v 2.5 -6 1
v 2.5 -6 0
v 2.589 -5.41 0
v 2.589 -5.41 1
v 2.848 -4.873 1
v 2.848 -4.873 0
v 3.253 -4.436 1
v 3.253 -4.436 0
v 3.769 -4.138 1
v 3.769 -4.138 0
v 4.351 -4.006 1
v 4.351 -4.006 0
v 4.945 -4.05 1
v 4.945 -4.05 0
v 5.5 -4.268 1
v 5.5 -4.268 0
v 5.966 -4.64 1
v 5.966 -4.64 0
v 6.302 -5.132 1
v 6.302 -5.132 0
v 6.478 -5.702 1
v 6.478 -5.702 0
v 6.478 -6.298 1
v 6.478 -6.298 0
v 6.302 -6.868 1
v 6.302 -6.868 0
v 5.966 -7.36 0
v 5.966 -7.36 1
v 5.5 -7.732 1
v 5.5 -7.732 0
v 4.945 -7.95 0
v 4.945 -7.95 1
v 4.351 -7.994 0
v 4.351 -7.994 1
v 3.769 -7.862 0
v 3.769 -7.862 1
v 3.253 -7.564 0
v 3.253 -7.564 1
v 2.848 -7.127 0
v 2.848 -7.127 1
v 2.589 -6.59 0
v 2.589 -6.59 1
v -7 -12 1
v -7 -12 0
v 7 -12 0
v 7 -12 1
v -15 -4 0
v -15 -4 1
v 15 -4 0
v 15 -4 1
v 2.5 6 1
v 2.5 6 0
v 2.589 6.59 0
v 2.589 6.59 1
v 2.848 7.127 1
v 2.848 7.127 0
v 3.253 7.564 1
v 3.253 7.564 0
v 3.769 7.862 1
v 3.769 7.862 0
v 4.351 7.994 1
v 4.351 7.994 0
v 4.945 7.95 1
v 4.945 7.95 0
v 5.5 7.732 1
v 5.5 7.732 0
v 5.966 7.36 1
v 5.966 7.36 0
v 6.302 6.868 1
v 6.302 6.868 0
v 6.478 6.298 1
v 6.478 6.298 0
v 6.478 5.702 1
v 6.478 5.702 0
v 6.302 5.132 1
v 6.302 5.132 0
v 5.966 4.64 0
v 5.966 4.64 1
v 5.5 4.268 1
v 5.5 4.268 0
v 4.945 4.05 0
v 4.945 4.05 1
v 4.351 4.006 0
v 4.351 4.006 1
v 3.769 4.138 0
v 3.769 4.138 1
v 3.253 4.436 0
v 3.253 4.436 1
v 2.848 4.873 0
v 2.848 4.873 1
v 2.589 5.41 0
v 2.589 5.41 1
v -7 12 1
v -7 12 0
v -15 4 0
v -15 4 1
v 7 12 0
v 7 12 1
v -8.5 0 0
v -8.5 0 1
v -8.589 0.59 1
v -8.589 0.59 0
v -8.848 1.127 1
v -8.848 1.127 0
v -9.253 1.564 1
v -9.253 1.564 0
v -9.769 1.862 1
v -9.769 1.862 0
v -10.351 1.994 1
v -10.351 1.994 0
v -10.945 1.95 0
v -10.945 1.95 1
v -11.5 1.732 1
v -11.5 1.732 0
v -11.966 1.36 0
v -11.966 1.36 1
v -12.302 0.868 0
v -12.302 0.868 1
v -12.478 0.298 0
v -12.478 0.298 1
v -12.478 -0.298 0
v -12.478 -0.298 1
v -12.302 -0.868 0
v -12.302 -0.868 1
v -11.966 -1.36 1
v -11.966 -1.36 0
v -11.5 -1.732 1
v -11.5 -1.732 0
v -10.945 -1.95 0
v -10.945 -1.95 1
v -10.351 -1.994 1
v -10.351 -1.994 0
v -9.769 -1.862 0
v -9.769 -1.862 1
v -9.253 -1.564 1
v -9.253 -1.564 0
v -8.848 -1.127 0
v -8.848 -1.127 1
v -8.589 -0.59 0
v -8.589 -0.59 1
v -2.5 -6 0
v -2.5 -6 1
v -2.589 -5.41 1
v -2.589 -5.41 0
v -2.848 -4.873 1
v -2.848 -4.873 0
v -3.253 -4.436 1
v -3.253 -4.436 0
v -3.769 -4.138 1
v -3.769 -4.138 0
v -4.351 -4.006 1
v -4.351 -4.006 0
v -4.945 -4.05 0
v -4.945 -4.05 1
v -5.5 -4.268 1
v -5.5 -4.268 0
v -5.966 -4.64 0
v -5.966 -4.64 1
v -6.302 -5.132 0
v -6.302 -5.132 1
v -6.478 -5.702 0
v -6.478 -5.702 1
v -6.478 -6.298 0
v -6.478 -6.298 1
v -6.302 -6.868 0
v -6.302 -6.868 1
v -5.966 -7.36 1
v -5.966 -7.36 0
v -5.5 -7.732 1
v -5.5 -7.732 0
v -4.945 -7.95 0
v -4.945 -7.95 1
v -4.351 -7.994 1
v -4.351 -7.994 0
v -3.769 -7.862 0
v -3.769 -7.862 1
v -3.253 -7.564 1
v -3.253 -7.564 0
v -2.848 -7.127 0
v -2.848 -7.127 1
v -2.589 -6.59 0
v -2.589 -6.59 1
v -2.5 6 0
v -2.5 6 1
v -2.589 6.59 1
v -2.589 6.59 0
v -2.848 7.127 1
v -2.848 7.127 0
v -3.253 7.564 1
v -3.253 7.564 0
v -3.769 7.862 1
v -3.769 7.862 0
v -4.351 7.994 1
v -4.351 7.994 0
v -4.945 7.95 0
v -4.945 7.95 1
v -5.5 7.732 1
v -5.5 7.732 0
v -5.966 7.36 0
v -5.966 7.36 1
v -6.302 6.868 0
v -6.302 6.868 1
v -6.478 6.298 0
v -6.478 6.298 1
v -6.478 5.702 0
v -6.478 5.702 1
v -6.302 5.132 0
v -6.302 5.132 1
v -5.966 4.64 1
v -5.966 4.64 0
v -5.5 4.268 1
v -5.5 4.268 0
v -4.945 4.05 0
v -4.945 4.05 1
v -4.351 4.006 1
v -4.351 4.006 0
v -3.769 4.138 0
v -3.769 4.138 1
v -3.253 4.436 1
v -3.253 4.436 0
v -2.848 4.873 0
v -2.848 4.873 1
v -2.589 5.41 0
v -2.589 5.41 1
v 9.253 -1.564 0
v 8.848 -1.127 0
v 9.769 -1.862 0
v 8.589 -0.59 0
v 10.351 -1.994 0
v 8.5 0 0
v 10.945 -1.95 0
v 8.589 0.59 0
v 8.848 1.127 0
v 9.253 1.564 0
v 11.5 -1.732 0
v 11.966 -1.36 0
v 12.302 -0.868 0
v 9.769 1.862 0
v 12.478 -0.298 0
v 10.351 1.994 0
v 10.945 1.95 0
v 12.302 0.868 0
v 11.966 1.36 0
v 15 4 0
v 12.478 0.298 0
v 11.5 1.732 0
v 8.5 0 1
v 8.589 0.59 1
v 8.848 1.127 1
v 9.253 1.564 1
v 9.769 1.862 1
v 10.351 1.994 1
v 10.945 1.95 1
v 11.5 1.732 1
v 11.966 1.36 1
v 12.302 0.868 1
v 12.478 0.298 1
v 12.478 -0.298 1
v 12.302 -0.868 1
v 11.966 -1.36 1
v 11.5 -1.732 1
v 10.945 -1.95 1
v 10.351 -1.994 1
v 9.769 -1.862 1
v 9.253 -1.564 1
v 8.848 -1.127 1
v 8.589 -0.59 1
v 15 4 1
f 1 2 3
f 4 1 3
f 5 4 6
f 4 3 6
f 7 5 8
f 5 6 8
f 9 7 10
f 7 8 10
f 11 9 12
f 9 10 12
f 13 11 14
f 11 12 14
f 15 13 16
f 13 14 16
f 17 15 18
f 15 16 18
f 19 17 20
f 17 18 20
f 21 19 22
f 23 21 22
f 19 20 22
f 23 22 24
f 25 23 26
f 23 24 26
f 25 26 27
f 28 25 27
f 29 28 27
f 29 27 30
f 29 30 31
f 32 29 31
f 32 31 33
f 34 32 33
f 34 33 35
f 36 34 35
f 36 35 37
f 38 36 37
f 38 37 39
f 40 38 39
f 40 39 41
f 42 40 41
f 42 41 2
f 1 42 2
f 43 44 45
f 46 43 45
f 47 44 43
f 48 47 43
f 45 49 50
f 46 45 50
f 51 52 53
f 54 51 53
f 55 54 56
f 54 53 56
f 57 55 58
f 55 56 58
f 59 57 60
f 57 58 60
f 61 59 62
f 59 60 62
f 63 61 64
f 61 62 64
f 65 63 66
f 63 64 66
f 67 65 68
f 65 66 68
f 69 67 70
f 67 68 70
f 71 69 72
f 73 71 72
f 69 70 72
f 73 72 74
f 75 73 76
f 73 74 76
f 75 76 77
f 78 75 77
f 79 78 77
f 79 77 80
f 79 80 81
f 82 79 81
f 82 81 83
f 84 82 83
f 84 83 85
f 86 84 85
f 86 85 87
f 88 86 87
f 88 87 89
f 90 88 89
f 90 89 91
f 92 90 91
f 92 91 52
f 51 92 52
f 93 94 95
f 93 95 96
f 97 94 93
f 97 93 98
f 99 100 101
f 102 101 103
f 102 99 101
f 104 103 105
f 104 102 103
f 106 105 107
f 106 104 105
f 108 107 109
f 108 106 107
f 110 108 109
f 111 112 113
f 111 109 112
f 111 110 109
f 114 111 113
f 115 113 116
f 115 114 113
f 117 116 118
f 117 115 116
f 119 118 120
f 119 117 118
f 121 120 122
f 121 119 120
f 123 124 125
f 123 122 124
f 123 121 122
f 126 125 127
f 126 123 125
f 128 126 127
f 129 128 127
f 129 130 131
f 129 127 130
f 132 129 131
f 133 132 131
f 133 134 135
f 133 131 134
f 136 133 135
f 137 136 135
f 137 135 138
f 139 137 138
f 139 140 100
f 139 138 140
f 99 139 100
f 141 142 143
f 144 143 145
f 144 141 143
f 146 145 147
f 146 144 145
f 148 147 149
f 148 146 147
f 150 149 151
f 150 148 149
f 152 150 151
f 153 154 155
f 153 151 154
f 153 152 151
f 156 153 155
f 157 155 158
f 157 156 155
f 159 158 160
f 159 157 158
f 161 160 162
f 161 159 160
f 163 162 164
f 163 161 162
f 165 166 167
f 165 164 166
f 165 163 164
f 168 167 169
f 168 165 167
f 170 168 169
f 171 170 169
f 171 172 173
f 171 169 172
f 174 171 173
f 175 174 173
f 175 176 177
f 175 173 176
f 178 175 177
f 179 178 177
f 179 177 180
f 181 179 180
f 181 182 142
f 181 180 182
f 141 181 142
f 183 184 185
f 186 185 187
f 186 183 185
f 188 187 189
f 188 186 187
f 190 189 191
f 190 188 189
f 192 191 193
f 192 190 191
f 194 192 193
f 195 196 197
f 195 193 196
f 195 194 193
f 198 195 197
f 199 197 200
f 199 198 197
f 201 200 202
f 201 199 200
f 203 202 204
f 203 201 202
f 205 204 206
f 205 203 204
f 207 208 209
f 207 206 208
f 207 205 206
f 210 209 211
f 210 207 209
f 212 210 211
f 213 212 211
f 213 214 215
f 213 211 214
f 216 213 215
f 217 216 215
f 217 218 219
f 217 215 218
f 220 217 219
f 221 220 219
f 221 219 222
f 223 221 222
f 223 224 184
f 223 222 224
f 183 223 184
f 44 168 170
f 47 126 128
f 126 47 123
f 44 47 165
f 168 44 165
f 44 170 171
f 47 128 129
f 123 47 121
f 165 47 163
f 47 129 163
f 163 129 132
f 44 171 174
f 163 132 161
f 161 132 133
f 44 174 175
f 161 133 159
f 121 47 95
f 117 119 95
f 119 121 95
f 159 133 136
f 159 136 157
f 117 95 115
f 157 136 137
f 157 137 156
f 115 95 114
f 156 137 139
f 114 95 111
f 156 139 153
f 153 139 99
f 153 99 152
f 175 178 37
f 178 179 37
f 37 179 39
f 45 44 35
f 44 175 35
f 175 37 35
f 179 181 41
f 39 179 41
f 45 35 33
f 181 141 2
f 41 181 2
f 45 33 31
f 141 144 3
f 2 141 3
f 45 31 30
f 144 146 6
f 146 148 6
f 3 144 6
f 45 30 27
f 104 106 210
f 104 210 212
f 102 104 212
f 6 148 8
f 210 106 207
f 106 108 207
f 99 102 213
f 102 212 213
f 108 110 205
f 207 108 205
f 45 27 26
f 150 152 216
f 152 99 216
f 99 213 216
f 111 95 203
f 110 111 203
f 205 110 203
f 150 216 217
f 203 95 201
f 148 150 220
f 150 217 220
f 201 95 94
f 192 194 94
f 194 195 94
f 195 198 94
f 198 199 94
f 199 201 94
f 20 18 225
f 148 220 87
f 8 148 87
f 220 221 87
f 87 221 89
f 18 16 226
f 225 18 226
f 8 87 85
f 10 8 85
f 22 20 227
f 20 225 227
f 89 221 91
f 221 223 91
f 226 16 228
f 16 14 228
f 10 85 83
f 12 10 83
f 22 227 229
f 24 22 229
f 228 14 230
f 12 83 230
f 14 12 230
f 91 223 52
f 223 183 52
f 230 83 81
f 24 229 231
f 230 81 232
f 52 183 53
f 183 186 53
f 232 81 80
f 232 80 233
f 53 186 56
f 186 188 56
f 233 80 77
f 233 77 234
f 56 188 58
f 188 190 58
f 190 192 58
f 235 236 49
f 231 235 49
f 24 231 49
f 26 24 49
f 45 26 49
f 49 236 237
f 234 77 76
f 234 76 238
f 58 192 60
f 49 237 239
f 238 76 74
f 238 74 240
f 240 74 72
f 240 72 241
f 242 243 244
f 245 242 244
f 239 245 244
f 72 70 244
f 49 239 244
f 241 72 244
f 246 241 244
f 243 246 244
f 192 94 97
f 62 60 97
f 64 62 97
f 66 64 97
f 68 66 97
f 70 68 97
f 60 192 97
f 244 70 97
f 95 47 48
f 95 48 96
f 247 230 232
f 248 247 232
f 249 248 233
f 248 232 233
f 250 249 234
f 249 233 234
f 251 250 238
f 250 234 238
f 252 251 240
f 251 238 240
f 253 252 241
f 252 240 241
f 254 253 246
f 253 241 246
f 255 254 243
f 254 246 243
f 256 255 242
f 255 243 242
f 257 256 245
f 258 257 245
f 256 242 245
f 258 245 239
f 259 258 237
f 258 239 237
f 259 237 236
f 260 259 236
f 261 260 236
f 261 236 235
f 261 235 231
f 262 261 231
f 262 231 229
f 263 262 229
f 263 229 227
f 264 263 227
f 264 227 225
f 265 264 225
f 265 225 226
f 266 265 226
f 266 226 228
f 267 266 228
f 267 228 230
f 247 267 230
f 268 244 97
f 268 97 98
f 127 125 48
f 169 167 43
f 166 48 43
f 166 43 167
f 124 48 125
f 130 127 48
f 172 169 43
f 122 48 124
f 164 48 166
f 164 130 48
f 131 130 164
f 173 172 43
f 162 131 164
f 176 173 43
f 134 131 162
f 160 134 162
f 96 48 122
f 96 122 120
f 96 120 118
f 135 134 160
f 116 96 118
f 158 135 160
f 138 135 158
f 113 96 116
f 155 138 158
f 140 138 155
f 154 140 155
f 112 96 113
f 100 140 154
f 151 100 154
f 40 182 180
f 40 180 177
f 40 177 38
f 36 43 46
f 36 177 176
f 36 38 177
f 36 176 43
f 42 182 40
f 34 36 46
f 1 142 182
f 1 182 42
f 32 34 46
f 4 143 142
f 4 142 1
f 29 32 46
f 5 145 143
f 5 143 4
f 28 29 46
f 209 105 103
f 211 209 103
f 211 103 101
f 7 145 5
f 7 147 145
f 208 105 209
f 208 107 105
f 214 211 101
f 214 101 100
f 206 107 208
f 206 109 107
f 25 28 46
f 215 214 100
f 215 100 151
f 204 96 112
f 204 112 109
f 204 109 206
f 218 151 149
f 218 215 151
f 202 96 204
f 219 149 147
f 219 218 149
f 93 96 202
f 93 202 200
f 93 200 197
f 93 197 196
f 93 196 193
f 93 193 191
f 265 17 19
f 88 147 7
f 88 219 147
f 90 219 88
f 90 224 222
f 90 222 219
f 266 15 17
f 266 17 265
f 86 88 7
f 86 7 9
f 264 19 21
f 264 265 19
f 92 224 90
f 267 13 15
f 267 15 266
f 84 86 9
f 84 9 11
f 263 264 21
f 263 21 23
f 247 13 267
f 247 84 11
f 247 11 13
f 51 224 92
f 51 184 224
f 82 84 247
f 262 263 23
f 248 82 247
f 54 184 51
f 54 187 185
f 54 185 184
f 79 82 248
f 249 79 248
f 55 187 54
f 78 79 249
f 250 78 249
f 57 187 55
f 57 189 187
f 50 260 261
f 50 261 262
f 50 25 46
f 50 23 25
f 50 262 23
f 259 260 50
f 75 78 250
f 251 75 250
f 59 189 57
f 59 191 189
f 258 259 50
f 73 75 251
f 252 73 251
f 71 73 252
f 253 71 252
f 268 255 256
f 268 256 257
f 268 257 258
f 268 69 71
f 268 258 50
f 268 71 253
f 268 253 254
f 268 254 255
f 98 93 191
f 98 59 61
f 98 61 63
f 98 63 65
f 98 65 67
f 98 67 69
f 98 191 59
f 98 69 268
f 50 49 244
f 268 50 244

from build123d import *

# Parameters (mm, degrees)
SKETCH1_W           = 30
SKETCH1_H           = 24
BOSS_EXTRUDE1_DEPTH = 1
SKETCH3_R           = 2
CUT_EXTRUDE1_DEPTH  = 3
CHAMFER1_SIZE       = 8


with BuildPart() as part:
    # Sketch1 → Boss-Extrude1 (new body)
    with BuildSketch(Plane.XY):
        Rectangle(SKETCH1_W, SKETCH1_H)
    extrude(amount=BOSS_EXTRUDE1_DEPTH)

    # Sketch3 → Cut-Extrude1 (cut)
    with BuildSketch(Plane(origin=(0, 0, 0), x_dir=(-1, 0, 0), z_dir=(0, 0, -1))):
        with Locations((-4.5, 6)):
            Circle(SKETCH3_R)
        with Locations((-4.5, -6)):
            Circle(SKETCH3_R)
        with Locations((-10.5, 0)):
            Circle(SKETCH3_R)
    cut_extrude1 = extrude(amount=-CUT_EXTRUDE1_DEPTH, mode=Mode.SUBTRACT)

    # Chamfer1
    chamfer1_edges = [part.edges().sort_by_distance(p)[0] for p in [
        (15, -12, 0.5),
        (15, 12, 0.5),
        (-15, 12, 0.5),
        (-15, -12, 0.5),
    ]]
    chamfer(chamfer1_edges, length=CHAMFER1_SIZE)

    # Mirror1: Cut-Extrude1 across plane
    add(cut_extrude1.mirror(Plane(origin=(0, 0, 0), x_dir=(0, 0, 1), z_dir=(1, 0, 0))), mode=Mode.SUBTRACT)


solid = part.part
